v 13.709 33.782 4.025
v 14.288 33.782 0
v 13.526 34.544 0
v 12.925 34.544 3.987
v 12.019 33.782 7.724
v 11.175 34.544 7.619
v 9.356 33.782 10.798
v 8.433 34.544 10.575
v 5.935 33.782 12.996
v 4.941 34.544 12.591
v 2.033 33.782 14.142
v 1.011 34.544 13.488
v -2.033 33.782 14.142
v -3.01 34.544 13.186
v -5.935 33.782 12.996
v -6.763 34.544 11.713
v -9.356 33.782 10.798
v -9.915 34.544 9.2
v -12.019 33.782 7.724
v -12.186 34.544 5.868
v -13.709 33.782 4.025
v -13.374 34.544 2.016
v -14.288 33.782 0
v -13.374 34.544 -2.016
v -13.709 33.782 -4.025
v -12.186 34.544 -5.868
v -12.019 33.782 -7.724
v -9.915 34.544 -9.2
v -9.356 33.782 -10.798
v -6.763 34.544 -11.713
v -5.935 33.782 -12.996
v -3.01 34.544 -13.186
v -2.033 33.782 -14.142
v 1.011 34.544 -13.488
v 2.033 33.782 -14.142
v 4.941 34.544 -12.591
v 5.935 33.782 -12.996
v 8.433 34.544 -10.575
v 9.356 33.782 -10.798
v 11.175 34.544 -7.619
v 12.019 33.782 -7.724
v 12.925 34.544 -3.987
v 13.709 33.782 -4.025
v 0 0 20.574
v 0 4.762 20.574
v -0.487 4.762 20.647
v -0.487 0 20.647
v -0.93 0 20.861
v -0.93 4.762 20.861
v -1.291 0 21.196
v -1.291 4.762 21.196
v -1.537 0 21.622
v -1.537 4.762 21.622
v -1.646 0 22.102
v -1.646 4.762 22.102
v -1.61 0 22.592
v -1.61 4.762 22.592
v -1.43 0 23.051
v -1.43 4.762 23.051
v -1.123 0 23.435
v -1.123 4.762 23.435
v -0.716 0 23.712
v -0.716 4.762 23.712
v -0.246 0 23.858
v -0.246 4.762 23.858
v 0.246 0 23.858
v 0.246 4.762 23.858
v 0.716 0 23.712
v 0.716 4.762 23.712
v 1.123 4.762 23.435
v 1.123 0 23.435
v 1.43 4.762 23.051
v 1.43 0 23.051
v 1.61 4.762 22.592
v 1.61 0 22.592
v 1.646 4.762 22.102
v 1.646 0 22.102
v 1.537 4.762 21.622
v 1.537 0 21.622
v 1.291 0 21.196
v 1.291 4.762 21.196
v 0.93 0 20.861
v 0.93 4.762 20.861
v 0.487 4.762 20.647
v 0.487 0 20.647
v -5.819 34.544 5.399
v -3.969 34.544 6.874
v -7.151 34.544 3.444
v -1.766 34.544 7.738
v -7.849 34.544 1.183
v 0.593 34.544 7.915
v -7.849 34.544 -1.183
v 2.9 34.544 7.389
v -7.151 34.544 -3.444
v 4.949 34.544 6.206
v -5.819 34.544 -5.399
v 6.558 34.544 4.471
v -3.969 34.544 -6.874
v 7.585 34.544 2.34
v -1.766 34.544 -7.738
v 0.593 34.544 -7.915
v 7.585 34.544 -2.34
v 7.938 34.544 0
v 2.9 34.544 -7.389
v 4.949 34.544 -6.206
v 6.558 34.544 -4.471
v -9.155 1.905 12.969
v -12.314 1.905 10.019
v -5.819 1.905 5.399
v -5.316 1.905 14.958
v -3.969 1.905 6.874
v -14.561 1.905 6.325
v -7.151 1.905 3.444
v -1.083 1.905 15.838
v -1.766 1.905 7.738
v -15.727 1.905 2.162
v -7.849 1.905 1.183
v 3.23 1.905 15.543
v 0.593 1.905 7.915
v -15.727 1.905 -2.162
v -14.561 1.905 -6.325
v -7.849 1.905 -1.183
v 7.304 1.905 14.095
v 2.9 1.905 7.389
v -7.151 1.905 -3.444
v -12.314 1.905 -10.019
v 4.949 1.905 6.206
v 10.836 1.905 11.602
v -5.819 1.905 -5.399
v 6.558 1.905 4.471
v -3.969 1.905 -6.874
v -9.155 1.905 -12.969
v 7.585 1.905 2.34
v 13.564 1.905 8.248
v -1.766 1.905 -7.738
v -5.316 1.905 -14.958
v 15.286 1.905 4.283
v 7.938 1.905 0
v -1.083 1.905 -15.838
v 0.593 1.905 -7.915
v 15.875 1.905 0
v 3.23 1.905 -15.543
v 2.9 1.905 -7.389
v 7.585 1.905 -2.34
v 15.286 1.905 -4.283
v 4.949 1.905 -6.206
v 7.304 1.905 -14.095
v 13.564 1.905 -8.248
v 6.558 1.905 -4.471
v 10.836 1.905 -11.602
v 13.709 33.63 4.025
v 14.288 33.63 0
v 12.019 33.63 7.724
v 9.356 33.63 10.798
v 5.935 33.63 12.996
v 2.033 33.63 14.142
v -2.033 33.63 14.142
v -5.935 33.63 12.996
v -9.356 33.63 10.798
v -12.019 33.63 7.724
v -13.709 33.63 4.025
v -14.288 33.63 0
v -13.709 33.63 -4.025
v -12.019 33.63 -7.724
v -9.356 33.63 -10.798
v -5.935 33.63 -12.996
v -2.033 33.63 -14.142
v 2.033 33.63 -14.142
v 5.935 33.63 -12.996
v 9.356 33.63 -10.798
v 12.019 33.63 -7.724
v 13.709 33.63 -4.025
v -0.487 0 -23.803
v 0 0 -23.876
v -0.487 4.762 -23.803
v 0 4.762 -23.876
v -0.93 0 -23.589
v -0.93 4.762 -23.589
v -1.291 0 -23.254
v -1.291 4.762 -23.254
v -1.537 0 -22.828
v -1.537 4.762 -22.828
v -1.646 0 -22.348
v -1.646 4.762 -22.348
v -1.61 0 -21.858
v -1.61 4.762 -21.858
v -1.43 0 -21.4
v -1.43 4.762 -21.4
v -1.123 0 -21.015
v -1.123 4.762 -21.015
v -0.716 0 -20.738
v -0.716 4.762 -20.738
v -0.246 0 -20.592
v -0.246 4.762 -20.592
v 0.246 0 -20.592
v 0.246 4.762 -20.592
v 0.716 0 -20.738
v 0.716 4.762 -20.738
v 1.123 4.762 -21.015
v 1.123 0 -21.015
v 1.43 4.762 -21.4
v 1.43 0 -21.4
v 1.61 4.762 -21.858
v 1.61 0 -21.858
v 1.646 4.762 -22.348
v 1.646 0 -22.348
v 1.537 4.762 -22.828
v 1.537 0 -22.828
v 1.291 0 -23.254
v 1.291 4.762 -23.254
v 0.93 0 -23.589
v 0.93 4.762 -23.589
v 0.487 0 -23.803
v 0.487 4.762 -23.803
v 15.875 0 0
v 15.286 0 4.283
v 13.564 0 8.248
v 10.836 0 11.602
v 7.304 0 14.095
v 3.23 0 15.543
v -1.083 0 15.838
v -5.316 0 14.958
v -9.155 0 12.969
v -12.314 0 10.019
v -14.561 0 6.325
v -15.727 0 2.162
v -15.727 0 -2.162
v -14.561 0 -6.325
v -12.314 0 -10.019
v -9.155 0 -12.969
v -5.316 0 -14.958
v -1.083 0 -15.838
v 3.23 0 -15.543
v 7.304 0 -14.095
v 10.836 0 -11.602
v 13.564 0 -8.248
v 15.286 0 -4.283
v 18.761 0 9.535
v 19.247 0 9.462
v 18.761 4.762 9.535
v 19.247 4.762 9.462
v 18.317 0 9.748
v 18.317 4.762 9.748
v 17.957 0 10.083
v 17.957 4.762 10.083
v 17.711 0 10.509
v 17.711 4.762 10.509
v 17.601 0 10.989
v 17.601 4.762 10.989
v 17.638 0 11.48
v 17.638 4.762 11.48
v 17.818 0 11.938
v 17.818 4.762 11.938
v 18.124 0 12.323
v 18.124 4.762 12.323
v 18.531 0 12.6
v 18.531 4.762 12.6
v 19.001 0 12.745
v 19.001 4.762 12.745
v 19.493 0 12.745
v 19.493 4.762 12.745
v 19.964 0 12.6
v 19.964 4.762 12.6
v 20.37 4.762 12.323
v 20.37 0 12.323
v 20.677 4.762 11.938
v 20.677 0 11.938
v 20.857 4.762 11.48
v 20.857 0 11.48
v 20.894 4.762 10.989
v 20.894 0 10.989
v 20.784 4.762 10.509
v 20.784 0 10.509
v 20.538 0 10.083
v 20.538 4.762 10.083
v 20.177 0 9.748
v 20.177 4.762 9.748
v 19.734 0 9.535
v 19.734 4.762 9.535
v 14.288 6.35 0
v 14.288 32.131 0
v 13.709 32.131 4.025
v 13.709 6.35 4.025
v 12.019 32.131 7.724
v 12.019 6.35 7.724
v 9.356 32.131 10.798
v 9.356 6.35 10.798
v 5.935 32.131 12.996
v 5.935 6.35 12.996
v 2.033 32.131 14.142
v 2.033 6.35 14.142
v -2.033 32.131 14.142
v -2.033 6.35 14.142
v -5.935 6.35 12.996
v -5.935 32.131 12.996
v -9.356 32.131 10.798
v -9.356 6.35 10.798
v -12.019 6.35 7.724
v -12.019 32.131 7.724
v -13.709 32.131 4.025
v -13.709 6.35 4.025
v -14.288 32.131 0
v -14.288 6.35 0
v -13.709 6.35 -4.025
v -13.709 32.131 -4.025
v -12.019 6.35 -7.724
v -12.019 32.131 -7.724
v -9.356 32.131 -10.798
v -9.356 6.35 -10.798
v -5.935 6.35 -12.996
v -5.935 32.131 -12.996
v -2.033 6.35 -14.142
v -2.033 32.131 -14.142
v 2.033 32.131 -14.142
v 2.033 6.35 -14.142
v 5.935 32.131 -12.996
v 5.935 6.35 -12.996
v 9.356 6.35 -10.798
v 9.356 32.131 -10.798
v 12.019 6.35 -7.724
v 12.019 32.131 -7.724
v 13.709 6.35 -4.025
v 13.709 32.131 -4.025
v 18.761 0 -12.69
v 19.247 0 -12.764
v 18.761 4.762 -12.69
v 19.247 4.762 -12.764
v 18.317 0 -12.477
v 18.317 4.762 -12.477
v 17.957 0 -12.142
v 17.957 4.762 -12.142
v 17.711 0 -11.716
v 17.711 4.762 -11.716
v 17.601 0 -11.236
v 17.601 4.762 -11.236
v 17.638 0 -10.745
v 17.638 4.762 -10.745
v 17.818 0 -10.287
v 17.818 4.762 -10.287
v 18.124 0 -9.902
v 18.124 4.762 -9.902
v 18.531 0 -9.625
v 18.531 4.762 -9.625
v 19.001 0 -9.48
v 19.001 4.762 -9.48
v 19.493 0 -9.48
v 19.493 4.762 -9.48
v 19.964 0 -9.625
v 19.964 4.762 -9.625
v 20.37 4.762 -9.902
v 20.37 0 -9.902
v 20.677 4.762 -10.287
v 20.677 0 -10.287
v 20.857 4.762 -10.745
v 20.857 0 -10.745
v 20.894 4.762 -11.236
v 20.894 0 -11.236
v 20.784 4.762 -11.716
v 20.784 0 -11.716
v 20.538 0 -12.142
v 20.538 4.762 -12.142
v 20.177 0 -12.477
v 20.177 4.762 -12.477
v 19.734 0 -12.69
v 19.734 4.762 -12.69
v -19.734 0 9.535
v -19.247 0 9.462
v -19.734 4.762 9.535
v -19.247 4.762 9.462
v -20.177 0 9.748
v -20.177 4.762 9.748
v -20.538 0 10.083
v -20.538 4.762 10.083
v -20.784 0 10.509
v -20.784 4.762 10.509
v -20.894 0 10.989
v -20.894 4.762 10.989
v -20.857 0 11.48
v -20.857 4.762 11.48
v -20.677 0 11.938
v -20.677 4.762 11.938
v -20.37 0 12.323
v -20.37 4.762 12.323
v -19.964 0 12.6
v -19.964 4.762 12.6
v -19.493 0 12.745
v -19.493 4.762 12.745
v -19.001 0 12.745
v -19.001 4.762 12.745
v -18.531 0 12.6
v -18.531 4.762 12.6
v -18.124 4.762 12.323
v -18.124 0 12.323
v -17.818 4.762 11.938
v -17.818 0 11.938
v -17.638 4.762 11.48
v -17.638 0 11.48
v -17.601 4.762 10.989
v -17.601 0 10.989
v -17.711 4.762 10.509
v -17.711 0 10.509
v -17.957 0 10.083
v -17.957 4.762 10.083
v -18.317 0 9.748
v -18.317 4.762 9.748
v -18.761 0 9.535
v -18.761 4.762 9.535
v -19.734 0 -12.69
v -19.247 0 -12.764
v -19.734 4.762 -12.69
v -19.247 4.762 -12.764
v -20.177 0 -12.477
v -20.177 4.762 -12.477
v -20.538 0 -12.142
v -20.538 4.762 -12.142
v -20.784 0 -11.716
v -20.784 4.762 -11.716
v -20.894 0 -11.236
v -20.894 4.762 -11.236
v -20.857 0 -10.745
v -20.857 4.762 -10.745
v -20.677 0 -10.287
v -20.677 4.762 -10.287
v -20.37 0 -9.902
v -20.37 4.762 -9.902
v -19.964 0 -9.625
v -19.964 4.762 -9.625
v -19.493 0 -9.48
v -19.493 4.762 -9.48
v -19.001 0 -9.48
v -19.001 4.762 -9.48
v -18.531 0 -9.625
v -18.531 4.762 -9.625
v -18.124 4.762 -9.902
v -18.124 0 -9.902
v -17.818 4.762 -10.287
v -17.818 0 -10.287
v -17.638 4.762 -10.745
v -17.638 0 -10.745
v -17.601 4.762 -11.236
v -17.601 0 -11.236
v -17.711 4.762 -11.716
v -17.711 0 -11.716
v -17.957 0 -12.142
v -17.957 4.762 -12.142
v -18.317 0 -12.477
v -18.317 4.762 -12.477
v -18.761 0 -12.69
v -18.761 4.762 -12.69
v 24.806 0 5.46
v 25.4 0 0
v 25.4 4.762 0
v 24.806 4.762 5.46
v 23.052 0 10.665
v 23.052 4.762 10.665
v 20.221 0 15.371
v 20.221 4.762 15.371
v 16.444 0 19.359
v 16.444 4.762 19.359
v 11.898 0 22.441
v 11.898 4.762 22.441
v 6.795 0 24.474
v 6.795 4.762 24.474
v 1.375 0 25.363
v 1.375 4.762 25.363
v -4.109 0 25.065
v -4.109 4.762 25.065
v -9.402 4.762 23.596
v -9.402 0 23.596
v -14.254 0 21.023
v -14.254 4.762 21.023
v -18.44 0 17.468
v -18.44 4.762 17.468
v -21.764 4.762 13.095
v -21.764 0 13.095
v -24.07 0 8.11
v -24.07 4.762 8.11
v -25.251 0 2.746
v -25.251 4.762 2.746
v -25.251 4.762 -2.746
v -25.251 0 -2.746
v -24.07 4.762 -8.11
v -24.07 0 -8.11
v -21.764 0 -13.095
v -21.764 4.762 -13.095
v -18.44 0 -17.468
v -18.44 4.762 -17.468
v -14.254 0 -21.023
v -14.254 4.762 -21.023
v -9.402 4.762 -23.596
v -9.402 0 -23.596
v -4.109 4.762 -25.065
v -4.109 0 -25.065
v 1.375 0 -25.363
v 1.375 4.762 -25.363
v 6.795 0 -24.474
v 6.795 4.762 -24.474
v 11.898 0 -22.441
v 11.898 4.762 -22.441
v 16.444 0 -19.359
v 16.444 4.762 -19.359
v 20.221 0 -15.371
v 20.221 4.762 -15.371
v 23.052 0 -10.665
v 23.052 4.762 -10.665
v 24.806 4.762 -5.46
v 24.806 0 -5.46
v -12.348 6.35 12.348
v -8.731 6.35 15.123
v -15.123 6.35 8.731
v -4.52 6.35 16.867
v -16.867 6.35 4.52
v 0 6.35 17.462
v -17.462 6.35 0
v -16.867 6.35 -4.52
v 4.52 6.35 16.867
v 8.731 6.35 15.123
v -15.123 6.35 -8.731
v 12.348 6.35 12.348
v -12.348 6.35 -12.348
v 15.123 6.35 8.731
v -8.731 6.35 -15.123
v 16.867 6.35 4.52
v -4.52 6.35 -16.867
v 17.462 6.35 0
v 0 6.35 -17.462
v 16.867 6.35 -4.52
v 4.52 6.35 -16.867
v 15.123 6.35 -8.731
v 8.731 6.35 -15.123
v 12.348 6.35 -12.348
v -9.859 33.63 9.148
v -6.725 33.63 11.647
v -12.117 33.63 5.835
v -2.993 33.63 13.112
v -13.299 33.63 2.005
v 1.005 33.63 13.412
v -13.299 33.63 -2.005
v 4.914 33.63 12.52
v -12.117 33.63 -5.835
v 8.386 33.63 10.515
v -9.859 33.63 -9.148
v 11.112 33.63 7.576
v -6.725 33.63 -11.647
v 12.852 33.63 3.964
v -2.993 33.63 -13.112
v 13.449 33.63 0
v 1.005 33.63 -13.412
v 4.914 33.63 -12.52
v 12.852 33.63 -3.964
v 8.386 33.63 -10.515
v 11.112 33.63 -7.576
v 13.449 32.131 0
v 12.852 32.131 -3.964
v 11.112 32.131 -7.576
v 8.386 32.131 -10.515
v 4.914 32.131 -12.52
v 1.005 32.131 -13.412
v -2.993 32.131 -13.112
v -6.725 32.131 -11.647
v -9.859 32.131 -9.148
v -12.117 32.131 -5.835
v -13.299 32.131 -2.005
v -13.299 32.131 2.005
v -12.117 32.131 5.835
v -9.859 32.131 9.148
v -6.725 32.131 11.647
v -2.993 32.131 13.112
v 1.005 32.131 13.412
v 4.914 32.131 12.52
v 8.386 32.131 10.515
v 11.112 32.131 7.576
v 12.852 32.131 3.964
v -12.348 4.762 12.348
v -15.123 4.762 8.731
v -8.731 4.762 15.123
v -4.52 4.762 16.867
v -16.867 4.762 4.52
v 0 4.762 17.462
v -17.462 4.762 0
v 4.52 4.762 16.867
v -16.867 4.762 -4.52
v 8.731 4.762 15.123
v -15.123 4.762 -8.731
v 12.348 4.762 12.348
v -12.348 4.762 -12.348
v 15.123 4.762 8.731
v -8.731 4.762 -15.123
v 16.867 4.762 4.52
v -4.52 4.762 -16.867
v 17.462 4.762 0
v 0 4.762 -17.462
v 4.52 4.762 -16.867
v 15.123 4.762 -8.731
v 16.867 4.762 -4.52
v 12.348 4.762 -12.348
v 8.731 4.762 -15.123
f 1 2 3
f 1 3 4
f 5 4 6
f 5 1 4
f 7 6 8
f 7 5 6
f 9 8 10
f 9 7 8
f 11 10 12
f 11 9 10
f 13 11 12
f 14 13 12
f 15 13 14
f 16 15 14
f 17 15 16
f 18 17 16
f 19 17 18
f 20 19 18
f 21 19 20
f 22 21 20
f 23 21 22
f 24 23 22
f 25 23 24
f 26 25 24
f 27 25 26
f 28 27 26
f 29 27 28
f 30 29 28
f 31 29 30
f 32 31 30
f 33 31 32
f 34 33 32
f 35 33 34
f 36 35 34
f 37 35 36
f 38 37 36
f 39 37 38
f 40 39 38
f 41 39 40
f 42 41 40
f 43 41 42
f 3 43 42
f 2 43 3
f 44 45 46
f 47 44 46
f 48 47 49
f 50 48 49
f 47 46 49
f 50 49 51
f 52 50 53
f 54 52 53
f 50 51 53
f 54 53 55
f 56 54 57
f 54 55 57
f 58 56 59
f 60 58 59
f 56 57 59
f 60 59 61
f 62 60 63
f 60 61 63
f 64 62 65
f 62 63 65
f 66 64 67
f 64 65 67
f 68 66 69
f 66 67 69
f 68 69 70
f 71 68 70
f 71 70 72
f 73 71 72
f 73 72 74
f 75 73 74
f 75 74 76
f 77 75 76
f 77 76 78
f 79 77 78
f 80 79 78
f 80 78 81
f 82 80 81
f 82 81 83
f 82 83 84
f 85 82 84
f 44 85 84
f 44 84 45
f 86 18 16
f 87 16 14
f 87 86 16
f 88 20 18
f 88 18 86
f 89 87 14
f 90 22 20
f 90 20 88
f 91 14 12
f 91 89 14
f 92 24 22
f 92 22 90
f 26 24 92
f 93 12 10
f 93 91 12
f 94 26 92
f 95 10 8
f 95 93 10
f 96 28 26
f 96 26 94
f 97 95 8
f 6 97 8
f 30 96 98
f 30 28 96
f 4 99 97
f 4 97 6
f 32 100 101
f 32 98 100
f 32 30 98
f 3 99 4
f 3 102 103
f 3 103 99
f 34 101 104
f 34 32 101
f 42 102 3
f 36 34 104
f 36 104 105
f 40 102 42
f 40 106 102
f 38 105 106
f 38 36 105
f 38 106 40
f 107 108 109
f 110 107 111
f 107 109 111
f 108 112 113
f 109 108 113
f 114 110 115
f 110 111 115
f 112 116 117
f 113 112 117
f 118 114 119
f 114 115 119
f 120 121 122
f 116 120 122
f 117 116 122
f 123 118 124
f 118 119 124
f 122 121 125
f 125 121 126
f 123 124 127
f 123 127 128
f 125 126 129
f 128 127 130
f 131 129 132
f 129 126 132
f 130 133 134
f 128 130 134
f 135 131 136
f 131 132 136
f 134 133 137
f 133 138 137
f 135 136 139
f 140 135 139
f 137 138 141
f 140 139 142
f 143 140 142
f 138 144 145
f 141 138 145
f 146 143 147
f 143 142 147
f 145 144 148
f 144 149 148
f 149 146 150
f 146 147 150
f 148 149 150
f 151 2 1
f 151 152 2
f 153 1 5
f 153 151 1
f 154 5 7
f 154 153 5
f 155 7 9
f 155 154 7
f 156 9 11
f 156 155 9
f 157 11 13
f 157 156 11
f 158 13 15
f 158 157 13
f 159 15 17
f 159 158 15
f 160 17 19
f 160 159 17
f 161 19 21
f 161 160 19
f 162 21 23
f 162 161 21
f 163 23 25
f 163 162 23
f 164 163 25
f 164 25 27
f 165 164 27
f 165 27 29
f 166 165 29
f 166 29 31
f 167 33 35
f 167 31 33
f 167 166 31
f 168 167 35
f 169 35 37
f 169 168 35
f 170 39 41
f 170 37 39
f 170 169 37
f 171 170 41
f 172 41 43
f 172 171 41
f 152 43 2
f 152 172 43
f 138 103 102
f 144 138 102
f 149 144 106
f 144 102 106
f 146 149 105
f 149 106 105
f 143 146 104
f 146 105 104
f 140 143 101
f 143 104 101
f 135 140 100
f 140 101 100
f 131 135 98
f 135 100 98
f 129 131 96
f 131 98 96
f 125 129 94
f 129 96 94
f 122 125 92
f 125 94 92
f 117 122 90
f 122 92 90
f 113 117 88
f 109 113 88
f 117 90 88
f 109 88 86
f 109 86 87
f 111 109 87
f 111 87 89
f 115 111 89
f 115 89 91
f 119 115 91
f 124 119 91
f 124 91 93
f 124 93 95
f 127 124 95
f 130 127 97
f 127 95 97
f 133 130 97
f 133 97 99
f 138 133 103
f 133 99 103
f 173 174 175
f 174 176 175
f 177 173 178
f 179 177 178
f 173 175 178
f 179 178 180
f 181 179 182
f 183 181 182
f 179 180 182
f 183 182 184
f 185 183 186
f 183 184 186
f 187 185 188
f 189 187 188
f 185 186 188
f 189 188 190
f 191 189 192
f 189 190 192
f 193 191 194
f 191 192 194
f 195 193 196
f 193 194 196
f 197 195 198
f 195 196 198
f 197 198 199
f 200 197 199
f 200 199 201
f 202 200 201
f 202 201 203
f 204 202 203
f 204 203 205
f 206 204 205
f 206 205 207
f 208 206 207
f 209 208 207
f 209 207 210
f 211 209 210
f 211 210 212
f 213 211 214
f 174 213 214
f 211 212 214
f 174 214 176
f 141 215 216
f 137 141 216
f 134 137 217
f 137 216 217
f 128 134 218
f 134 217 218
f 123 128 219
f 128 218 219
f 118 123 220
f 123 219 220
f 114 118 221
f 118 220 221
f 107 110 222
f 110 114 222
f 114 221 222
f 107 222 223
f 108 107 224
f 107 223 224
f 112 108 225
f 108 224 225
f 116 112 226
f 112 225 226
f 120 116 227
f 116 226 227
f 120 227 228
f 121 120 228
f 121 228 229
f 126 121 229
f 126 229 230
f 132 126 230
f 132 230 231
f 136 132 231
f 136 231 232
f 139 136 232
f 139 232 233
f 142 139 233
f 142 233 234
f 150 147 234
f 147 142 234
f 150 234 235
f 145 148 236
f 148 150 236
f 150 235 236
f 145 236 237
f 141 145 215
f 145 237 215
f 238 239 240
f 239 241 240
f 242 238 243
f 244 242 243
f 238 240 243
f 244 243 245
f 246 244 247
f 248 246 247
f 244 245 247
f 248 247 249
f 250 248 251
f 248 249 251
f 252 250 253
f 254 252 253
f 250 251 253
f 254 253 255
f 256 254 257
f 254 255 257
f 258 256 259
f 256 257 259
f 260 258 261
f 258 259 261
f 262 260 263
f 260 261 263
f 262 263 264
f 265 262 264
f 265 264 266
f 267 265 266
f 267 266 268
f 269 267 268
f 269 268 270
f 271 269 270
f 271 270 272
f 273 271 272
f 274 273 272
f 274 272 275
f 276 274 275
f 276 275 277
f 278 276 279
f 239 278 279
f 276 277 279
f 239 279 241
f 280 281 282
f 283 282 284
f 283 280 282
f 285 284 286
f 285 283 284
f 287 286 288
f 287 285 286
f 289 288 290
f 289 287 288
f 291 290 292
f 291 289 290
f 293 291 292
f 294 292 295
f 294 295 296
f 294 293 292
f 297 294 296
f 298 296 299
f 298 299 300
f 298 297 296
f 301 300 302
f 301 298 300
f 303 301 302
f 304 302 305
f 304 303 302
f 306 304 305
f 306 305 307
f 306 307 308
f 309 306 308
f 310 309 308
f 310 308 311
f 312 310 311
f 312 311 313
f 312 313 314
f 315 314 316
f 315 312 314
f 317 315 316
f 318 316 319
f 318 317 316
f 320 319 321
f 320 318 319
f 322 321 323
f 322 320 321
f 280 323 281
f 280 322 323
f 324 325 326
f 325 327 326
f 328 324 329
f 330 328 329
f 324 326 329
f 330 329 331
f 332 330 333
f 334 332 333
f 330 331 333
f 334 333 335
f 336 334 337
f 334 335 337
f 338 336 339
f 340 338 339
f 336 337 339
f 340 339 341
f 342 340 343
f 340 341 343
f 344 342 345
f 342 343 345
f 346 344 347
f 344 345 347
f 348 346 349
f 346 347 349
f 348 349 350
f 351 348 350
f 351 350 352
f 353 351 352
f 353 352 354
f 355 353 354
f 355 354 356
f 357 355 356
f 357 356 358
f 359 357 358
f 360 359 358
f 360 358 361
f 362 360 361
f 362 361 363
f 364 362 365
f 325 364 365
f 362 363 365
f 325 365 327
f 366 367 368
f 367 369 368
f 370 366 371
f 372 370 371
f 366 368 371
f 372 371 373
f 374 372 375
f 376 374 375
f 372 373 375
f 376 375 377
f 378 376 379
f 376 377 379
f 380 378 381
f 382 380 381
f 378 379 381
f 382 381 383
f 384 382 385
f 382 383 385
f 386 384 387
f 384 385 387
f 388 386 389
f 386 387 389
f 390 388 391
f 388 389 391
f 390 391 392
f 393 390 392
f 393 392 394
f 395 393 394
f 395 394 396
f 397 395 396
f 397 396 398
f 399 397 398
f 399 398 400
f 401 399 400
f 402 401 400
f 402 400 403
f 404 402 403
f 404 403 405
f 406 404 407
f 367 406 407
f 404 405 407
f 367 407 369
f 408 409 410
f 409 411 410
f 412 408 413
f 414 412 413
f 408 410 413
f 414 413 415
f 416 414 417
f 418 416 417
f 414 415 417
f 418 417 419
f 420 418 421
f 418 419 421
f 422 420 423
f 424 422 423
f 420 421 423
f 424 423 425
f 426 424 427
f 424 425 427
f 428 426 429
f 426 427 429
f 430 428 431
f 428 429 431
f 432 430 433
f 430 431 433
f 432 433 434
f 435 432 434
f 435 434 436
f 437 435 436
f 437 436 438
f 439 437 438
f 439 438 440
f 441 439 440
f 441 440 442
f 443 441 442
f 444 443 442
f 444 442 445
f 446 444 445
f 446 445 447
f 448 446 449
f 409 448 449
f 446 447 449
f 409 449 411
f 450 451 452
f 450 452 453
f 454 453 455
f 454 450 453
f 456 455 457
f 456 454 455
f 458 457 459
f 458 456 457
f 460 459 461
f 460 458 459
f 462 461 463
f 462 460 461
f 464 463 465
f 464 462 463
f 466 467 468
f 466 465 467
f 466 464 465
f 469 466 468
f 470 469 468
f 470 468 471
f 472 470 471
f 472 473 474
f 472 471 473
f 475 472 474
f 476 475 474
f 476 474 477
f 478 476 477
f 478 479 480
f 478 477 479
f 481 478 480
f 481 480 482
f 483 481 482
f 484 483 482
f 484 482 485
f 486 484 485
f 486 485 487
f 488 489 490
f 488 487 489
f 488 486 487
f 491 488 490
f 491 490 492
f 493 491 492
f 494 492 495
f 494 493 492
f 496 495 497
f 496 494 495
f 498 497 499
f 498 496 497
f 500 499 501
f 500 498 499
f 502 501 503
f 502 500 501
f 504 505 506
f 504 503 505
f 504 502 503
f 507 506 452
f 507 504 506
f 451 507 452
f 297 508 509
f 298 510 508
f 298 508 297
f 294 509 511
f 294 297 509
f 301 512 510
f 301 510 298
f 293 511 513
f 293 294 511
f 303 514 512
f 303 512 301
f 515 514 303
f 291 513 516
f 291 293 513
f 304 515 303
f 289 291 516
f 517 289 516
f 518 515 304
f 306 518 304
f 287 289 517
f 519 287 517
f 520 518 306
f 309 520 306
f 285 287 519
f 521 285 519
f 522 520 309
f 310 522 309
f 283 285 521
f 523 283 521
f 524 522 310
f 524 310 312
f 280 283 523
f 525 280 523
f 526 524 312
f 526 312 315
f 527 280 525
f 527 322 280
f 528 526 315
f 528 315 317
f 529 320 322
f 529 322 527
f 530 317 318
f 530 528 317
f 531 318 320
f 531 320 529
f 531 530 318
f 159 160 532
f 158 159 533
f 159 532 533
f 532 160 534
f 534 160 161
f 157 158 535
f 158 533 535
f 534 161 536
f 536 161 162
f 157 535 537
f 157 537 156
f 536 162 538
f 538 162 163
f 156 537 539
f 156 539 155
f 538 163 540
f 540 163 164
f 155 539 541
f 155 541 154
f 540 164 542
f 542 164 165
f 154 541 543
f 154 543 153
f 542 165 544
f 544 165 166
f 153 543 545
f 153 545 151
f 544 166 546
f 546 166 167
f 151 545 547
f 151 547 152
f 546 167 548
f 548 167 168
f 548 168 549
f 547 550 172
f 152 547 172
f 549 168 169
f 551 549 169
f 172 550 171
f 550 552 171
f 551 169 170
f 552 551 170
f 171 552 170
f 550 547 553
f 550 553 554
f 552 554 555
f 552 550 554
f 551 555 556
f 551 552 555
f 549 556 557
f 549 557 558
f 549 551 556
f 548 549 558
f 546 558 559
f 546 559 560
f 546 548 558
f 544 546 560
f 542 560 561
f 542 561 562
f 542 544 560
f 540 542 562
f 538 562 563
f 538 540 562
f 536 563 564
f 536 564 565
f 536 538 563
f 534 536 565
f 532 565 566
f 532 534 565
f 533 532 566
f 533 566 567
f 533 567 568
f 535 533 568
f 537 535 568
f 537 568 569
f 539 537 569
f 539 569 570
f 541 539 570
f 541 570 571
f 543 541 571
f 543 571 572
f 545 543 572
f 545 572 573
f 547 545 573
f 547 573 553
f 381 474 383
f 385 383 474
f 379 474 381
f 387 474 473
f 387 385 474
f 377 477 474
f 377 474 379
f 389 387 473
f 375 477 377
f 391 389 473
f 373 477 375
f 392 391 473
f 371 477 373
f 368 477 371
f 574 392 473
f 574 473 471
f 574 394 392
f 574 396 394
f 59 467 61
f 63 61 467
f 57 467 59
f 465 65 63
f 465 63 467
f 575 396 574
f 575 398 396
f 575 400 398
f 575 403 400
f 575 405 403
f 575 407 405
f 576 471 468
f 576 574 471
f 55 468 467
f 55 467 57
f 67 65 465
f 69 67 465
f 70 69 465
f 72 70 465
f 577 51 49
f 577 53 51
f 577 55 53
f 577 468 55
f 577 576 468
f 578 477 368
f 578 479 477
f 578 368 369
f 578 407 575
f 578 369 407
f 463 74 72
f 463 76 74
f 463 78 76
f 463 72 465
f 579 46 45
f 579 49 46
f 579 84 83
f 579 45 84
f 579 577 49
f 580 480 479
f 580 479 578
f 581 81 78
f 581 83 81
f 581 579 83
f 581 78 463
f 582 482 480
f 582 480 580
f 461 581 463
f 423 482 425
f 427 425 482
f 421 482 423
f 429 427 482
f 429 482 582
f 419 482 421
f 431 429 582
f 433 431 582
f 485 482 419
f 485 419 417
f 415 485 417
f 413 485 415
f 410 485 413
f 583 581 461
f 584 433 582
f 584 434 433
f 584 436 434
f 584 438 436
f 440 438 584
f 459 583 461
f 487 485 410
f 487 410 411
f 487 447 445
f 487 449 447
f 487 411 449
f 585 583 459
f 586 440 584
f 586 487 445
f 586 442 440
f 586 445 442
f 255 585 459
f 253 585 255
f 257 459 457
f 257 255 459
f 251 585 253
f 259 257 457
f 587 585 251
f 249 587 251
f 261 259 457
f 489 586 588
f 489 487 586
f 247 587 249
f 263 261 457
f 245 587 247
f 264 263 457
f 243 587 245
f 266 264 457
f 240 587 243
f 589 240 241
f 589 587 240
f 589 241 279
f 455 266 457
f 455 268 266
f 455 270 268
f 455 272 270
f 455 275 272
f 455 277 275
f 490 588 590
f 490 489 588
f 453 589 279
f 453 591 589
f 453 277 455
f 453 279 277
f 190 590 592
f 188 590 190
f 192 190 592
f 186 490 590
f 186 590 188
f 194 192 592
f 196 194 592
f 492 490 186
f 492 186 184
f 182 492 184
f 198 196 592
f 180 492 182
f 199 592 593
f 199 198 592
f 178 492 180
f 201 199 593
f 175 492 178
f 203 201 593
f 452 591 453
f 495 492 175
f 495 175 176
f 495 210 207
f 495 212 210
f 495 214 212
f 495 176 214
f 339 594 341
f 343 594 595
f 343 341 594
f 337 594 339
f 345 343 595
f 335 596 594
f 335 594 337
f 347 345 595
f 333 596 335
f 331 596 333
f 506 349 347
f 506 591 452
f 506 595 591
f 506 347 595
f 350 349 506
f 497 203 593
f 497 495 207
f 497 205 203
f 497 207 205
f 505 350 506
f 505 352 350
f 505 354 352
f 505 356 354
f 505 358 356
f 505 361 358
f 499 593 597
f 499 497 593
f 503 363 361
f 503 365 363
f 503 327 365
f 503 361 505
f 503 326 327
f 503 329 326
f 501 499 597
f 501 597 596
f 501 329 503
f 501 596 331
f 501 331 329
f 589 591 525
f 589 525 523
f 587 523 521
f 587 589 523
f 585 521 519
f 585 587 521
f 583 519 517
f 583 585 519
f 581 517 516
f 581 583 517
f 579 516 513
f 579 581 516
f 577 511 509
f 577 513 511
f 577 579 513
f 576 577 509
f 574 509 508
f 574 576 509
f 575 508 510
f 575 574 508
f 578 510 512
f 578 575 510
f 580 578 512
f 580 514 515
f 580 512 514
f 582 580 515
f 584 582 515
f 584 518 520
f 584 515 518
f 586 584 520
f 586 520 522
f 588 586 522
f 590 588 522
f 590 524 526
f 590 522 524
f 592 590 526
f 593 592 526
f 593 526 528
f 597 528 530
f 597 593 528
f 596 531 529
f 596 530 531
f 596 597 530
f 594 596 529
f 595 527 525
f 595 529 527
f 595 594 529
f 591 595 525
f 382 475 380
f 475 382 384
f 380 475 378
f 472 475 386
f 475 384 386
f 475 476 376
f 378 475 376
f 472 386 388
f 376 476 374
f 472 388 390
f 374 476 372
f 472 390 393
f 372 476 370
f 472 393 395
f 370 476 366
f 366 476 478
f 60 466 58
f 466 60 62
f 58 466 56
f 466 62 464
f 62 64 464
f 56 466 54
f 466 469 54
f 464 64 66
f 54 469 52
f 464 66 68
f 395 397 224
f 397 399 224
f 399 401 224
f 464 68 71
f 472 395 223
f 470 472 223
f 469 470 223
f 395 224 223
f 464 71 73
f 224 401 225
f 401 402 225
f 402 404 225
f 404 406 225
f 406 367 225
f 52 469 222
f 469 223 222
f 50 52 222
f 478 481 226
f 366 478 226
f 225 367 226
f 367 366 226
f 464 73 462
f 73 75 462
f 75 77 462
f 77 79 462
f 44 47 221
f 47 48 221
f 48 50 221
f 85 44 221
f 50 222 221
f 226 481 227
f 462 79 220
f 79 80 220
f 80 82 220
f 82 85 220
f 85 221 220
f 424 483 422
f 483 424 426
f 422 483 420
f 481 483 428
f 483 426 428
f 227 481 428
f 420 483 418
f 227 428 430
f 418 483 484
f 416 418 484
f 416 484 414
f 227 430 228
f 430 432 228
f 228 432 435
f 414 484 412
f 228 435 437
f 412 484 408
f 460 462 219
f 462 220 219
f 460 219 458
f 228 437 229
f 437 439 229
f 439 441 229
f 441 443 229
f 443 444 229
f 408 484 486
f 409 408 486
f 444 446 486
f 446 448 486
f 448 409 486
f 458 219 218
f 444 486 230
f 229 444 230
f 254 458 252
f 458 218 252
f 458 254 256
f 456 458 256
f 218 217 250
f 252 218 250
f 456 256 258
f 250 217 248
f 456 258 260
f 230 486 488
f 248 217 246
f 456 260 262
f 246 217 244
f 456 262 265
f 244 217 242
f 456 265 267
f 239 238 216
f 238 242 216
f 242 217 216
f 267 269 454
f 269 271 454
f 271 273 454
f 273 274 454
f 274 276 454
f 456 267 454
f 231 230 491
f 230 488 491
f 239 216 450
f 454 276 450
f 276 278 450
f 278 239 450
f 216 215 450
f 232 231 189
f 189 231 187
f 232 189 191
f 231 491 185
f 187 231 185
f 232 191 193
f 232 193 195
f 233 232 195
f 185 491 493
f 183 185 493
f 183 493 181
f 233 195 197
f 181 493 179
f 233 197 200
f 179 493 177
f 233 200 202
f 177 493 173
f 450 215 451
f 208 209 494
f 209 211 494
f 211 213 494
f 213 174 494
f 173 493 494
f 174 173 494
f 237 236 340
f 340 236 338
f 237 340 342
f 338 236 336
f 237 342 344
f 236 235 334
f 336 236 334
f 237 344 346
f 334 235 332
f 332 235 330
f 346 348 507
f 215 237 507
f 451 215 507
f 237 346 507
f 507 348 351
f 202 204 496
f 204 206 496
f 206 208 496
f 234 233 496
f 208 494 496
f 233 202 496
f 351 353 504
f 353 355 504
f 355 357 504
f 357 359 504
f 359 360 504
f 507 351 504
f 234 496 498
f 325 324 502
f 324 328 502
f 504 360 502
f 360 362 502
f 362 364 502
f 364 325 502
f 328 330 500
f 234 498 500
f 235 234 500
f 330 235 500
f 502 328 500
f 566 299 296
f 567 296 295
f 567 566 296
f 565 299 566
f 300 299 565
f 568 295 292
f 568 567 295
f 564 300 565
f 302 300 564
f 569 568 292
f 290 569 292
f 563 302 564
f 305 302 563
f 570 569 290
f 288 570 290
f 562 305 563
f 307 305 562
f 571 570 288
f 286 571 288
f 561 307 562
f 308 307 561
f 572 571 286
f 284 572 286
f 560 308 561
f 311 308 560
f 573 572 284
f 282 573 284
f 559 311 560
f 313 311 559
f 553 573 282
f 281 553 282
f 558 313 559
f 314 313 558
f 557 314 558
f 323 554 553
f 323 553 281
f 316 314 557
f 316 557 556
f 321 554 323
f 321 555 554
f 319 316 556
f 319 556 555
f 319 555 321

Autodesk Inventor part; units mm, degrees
ref_plane "YZ Plane" through (0, 0, 0) normal (1, 0, 0) x (0, 1, 0)
ref_plane "XZ Plane" through (0, 0, 0) normal (0, 1, 0) x (-1, 0, 0)
ref_plane "XY Plane" through (0, 0, 0) normal (0, 0, 1) x (1, 0, 0)
sketch "Sketch1" plane through (0, 0, 0) normal (0, 0, 1) x (1, 0, 0)
  line L0 (0, 0) -> (0, 30.8582)
  line L1 (7.9375, 1.905) -> (7.9375, 34.544)
  line L2 (7.9375, 34.544) -> (14.2875, 34.544)
  line L3 (14.2875, 34.544) -> (14.2875, 6.35)
  line L4 (17.4625, 4.7625) -> (25.4, 4.7625)
  line L5 (25.4, 4.7625) -> (25.4, 0)
  line L6 (25.4, 0) -> (15.875, 0)
  line L7 (7.9375, 1.905) -> (15.875, 1.905)
  line L8 (15.875, 1.905) -> (15.875, 0)
  line L9 (14.2875, 6.35) -> (17.4625, 6.35)
  line L10 (17.4625, 6.35) -> (17.4625, 4.7625)
  dimension "d0" = 50.8
  dimension "d1" = 15.875
  dimension "d2" = 28.575
  dimension "d3" = 4.7625
  dimension "d19" = 31.75
  dimension "d20" = 1.905
  dimension "d30" = 34.925
  dimension "d31" = 1.5875
  dimension "d34" = 34.544
revolve "Revolution1" add sketch "Sketch1" angle 360 about axis through (0, 0, 0) along (0, 1, 0)
sketch "Sketch4" plane through (0, 0, 0) normal (0, 0, 1) x (1, 0, 0)
  line L0 (13.4493, 33.6296) -> (17.9779, 33.6296)
  line L1 (17.9779, 33.6296) -> (17.9779, 32.131)
  line L2 (17.9779, 32.131) -> (13.4493, 32.131)
  line L3 (13.4493, 32.131) -> (13.4493, 33.6296)
  line L4 (-25.4, 4.7625) -> (25.4, 4.7625) projected
  line L5 (-14.2875, 34.544) -> (14.2875, 34.544) projected
  line L6 (0, 34.544) -> (0, 40.6447)
  line L7 (-17.4625, 6.35) -> (17.4625, 6.35) projected
  point P0 (0, 0)
  dimension "d26" = 1.4986
  dimension "d27" = 26.8986
  dimension "d33" = 25.781
revolve "Revolution2" cut sketch "Sketch4" angle 360 about axis through (0, 34.544, 0) along (0, 1, 0)
chamfer "Chamfer1" distance 0.762 angle 45 1 edges at (-14.2875, 34.544, 0)
sketch "Sketch2" plane through (0, 0, 0) normal (0, -1, 0) x (1, 0, 0)
  circle A0 centre (0, 0) radius 22.225 construction
  point P0 (0, -22.225)
  point P1 (19.2474, -11.1125)
  point P2 (19.2474, 11.1125)
  point P3 (0, 22.225)
  point P4 (-19.2474, 11.1125)
  point P5 (-19.2474, -11.1125)
  dimension "d7" = 44.45
  dimension "d10" = 360
hole "Hole1" at (0, 0, -22.225) at (19.2474, 0, -11.1125) at (19.2474, 0, 11.1125) at (0, 0, 22.225) at (-19.2474, 0, 11.1125) at (-19.2474, 0, -11.1125) direction (0, 1, 0) diameter 3.302 end through all thread size "8-32 UNC" class "2B" standard "ANSI Unified Screw Threads"
properties part number "FLY_006_HoodPivot" material "Aluminum 6061"
